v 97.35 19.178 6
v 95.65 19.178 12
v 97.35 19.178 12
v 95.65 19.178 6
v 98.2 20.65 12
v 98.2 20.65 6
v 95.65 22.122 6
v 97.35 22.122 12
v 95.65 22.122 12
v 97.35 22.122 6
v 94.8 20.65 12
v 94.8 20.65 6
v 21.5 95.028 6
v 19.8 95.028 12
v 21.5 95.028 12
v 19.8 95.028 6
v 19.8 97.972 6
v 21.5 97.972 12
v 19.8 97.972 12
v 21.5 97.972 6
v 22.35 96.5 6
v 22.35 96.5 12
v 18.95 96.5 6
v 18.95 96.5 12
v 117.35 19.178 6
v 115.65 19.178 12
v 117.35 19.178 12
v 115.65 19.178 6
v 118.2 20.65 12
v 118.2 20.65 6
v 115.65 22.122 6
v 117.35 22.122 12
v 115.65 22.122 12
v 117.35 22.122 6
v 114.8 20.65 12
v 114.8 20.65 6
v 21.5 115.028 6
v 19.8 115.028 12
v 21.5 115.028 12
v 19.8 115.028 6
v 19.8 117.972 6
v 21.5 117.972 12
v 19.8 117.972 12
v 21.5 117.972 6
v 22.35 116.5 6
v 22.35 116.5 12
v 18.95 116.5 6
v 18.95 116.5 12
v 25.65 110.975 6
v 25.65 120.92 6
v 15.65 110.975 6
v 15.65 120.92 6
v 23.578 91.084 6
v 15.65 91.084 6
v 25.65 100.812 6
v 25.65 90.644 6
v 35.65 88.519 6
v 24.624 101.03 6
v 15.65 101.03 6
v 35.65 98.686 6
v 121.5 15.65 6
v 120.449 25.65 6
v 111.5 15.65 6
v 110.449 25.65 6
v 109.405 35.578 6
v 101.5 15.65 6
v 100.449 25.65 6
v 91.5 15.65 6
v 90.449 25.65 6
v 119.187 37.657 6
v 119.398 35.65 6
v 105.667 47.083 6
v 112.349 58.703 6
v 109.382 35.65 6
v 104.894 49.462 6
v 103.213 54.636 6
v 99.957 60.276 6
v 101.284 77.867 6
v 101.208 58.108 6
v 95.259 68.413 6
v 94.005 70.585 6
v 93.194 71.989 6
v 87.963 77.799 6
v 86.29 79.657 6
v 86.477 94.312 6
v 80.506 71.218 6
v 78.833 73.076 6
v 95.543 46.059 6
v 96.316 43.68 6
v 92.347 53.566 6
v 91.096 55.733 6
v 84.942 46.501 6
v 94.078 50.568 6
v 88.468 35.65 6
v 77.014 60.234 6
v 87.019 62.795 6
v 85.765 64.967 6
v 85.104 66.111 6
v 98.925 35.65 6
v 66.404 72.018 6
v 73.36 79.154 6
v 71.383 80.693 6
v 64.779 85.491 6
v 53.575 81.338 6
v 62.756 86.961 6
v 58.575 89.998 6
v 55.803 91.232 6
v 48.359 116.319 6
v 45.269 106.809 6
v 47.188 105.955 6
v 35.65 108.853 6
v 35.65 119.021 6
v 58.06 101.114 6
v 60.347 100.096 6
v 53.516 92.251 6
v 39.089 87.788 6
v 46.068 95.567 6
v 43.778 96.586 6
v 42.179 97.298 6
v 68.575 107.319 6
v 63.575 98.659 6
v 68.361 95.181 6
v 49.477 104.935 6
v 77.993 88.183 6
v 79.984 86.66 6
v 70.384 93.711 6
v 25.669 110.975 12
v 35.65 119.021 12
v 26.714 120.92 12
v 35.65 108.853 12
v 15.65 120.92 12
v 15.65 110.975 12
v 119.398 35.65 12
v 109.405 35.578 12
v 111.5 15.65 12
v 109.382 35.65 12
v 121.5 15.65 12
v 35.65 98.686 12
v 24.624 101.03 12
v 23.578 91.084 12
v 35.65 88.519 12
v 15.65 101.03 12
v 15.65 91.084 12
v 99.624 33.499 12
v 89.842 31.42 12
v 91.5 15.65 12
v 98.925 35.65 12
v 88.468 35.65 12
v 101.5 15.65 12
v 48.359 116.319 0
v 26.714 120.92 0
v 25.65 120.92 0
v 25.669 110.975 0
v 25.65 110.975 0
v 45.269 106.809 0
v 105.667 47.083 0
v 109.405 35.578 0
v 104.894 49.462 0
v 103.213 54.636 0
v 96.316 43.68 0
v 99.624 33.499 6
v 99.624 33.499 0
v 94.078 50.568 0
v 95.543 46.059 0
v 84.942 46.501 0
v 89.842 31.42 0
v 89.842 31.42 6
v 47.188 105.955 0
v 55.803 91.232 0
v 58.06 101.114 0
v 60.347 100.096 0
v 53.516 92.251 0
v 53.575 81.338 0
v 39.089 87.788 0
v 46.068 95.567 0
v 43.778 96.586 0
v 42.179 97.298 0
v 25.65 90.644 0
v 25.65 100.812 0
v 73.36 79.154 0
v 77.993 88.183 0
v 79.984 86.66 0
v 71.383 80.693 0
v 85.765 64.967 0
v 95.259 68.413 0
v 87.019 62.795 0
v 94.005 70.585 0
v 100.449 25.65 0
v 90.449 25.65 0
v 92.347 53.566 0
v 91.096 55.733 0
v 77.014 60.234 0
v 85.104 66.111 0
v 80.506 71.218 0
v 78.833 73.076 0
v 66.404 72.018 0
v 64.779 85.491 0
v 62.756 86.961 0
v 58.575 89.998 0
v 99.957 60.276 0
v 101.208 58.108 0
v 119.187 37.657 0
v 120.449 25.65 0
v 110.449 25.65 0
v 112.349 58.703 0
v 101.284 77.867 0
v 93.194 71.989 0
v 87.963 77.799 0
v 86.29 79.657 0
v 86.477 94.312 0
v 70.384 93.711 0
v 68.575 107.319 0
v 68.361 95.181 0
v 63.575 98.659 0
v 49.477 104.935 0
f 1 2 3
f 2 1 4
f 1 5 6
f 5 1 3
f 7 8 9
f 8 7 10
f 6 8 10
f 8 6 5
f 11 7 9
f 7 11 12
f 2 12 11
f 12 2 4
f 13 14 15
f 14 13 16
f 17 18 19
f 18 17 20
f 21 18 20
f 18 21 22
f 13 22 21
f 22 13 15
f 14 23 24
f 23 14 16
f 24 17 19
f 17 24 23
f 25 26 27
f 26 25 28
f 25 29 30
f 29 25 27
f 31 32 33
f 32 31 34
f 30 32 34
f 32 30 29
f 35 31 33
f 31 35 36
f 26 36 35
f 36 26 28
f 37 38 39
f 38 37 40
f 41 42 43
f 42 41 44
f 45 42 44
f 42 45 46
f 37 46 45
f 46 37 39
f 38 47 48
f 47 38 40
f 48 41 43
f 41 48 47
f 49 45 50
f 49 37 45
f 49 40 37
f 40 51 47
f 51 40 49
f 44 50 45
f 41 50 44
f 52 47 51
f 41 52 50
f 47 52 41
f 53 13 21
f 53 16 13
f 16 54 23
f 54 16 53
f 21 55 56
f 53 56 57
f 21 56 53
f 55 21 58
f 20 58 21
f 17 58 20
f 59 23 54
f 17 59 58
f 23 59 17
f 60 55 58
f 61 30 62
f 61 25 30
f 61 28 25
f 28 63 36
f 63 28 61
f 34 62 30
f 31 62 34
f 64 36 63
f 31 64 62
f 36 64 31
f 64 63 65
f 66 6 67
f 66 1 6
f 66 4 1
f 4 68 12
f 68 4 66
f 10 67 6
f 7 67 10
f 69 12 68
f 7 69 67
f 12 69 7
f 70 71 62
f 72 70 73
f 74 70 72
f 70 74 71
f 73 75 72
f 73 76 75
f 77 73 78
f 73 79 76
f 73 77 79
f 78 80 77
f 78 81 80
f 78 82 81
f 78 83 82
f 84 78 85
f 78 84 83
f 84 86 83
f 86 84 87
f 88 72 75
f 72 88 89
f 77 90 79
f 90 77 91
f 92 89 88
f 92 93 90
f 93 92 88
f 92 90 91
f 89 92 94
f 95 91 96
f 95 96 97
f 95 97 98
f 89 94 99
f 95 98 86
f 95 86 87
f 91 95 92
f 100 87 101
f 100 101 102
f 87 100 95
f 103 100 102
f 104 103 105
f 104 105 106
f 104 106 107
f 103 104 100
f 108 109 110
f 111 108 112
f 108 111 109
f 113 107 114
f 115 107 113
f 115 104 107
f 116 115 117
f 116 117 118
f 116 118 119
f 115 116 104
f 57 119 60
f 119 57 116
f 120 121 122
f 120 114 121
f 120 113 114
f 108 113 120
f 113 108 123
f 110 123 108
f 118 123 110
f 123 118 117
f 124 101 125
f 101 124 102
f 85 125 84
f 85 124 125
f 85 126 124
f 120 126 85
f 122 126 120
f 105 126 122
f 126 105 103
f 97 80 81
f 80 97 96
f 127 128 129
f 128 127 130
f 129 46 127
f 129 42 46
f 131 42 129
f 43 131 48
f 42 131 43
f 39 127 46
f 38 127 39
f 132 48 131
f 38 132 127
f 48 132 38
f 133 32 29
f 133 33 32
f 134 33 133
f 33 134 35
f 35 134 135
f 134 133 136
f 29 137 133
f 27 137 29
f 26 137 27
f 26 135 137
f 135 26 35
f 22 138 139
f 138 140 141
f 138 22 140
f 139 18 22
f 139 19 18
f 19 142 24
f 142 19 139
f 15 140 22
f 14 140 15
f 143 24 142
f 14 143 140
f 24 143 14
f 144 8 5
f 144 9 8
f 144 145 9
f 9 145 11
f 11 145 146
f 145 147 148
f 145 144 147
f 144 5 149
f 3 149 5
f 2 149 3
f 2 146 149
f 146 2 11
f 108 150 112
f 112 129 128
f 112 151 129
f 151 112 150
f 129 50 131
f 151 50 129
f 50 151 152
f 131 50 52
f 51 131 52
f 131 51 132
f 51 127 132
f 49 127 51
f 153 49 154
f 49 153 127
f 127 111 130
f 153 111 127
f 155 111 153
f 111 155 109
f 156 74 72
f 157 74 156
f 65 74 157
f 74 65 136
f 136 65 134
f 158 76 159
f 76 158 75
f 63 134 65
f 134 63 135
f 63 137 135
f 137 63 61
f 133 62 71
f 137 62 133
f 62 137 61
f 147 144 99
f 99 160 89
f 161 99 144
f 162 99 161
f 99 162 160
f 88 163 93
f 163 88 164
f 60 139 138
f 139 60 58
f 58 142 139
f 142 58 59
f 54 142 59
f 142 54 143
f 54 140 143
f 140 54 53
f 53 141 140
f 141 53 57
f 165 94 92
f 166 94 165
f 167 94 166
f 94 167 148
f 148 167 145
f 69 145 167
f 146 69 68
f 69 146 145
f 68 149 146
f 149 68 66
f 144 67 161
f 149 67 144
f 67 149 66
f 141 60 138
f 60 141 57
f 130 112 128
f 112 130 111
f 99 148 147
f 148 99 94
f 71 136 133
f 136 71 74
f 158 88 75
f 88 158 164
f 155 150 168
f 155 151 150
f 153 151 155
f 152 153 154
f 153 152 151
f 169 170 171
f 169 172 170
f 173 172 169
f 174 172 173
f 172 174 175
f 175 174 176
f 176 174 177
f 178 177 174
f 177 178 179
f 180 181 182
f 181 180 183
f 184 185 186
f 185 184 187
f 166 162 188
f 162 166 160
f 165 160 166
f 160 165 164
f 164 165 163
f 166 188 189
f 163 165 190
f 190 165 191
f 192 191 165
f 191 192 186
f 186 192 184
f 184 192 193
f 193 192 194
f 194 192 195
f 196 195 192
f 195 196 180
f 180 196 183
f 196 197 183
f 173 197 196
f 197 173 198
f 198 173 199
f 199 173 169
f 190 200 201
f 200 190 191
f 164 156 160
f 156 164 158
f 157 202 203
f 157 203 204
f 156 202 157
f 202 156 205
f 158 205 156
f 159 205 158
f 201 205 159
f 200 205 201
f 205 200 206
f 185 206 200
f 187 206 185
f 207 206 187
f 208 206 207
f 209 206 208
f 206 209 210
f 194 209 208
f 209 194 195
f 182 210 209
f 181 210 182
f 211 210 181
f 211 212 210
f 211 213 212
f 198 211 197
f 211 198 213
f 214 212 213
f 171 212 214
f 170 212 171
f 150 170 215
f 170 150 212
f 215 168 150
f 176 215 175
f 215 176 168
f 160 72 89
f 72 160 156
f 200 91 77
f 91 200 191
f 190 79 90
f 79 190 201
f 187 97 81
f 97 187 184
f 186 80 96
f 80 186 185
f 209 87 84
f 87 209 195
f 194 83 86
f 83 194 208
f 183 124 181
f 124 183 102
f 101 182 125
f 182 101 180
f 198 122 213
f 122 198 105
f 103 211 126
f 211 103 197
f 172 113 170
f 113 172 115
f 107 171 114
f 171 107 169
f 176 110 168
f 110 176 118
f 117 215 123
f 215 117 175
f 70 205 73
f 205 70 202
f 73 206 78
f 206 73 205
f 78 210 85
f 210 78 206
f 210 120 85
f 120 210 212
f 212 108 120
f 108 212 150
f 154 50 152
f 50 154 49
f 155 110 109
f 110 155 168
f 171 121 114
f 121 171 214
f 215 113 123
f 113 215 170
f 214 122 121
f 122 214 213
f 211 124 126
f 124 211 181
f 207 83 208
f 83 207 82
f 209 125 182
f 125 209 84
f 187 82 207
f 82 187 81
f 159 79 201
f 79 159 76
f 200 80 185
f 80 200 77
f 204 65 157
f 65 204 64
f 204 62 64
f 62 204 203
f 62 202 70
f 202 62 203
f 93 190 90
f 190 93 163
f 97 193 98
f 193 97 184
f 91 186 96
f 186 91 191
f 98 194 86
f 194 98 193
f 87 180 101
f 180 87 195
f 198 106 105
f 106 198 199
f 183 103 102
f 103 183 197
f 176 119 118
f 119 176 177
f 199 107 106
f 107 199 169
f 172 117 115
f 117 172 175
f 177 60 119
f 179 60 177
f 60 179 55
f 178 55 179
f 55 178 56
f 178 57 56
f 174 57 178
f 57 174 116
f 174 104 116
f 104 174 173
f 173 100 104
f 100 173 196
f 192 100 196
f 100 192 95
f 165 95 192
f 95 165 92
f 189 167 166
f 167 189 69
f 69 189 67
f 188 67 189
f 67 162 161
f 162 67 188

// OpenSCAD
// file: buildvars.scad
function cube_size() = 56;
function tolerance() = 0.2;
function screw_r() = 3/2;
function arm_width() = 7;
function arm_length() = 35;
function servo_base_height() = 4;
function servo_elevation() = 5;
function gear_r() = 11;
function arm_c2c() = gear_r()*2.35;

function arm_inset_x() = arm_width() + 2;
function arm_inset_y() = gear_r()+arm_width();

function back_x() = 4.31*2;
function back_y() = -gear_r()-10;
function base_rounding_radius() = 7;
function nut_h() = 2.3;

function grip_pad_h() = servo_base_height();

function back_h() = nut_h()+servo_elevation()+2*servo_base_height();
function gripper_r() = back_h()/2;
function turn_h() = 30;
function turn_gap_h() = 5;
function turn_gap_d() = 2;
function turn_br() = base_rounding_radius();
function turn_sr() = turn_br()/2;
function turn_mr() = (turn_br()+turn_sr())/2;
function turn_pad() = 2;
function turn_gear_r() = 6;



function sh_r() = 8/2;
function sh_h() = 3;
function sh_w() = 10;


function holder_h() = 80; // height to center
function holder_d() = turn_h();
function holder_th() = 8;
function holder_w() = gripper_r()*2+holder_th()*2;
function holder_dst() = 183;


function gears_c2c() = 36;
function gear_conversion_factor() = 1; // old = 0.67;
function gear_round() = true;

function base_r() = (gears_c2c()-3)/2;
function servo_gear_f() = 2/(gear_conversion_factor()+1)*gear_conversion_factor();
function turn_gear_f() = 2-servo_gear_f();
function turn_gear_r() = base_r() * turn_gear_f();
function servo_gear_r() = base_r() * servo_gear_f();

function rail_sep_w() = sh_w()/4;
// main file
use <buildvars.scad>

module foot() {
    dst = holder_dst();
    w = holder_w()/2;
    r = dst/2-w;
    module c(r) {
        intersection() {
            translate([w,w])
            square([dst,dst]);
            translate([w,w])
            circle(r=r,h=2);
        }
    }

    linear_extrude(height=sh_h()*2) {
        intersection() {
            union() {
                difference() {
                    c(r+sh_w());
                    c(r);
                }
                difference() {
                    c(r+sh_w()+holder_d()-sh_w());
                    c(r+holder_d()-sh_w());
                }
            }
            translate([1,1]*(holder_w()/2+sh_w()))
            square([dst,dst]);

        }
        
    }
    
    module m(x,y) {
        translate([x,y,0]) children();
        translate([y,x,0]) children();
    }
    difference() {
        translate([0,0,sh_h()*2])
        linear_extrude(height=sh_h()*2) {
            difference() {
                c(r+sh_w());
                c(r);
            }
            difference() {
                c(r+sh_w()+holder_d()-sh_w());
                c(r+holder_d()-sh_w());
            }
        }
        translate([1,1,0]*(holder_w()/2+sh_w()*2))
        cube([dst,dst,30]);
        
        m(dst/2+sh_w()/2,holder_w()/2+sh_w()/2) cylinder(h=100,r=screw_r()+tolerance());
        m(dst/2+holder_d()-sh_w()/2,holder_w()/2+sh_w()/2) cylinder(h=100,r=screw_r()+tolerance());
    }
    
    a = 40;
    n = 8;
    cw = rail_sep_w();
    translate([w,w,0])
    for(i = [0:n-1])
    rotate(a/2+(90-a)/(n-1)*i)
    translate([dst/2-w+sh_w()/2,-cw/2,0])
    cube([holder_d()-sh_w(),cw,sh_h()*2]);

       
}

foot();
